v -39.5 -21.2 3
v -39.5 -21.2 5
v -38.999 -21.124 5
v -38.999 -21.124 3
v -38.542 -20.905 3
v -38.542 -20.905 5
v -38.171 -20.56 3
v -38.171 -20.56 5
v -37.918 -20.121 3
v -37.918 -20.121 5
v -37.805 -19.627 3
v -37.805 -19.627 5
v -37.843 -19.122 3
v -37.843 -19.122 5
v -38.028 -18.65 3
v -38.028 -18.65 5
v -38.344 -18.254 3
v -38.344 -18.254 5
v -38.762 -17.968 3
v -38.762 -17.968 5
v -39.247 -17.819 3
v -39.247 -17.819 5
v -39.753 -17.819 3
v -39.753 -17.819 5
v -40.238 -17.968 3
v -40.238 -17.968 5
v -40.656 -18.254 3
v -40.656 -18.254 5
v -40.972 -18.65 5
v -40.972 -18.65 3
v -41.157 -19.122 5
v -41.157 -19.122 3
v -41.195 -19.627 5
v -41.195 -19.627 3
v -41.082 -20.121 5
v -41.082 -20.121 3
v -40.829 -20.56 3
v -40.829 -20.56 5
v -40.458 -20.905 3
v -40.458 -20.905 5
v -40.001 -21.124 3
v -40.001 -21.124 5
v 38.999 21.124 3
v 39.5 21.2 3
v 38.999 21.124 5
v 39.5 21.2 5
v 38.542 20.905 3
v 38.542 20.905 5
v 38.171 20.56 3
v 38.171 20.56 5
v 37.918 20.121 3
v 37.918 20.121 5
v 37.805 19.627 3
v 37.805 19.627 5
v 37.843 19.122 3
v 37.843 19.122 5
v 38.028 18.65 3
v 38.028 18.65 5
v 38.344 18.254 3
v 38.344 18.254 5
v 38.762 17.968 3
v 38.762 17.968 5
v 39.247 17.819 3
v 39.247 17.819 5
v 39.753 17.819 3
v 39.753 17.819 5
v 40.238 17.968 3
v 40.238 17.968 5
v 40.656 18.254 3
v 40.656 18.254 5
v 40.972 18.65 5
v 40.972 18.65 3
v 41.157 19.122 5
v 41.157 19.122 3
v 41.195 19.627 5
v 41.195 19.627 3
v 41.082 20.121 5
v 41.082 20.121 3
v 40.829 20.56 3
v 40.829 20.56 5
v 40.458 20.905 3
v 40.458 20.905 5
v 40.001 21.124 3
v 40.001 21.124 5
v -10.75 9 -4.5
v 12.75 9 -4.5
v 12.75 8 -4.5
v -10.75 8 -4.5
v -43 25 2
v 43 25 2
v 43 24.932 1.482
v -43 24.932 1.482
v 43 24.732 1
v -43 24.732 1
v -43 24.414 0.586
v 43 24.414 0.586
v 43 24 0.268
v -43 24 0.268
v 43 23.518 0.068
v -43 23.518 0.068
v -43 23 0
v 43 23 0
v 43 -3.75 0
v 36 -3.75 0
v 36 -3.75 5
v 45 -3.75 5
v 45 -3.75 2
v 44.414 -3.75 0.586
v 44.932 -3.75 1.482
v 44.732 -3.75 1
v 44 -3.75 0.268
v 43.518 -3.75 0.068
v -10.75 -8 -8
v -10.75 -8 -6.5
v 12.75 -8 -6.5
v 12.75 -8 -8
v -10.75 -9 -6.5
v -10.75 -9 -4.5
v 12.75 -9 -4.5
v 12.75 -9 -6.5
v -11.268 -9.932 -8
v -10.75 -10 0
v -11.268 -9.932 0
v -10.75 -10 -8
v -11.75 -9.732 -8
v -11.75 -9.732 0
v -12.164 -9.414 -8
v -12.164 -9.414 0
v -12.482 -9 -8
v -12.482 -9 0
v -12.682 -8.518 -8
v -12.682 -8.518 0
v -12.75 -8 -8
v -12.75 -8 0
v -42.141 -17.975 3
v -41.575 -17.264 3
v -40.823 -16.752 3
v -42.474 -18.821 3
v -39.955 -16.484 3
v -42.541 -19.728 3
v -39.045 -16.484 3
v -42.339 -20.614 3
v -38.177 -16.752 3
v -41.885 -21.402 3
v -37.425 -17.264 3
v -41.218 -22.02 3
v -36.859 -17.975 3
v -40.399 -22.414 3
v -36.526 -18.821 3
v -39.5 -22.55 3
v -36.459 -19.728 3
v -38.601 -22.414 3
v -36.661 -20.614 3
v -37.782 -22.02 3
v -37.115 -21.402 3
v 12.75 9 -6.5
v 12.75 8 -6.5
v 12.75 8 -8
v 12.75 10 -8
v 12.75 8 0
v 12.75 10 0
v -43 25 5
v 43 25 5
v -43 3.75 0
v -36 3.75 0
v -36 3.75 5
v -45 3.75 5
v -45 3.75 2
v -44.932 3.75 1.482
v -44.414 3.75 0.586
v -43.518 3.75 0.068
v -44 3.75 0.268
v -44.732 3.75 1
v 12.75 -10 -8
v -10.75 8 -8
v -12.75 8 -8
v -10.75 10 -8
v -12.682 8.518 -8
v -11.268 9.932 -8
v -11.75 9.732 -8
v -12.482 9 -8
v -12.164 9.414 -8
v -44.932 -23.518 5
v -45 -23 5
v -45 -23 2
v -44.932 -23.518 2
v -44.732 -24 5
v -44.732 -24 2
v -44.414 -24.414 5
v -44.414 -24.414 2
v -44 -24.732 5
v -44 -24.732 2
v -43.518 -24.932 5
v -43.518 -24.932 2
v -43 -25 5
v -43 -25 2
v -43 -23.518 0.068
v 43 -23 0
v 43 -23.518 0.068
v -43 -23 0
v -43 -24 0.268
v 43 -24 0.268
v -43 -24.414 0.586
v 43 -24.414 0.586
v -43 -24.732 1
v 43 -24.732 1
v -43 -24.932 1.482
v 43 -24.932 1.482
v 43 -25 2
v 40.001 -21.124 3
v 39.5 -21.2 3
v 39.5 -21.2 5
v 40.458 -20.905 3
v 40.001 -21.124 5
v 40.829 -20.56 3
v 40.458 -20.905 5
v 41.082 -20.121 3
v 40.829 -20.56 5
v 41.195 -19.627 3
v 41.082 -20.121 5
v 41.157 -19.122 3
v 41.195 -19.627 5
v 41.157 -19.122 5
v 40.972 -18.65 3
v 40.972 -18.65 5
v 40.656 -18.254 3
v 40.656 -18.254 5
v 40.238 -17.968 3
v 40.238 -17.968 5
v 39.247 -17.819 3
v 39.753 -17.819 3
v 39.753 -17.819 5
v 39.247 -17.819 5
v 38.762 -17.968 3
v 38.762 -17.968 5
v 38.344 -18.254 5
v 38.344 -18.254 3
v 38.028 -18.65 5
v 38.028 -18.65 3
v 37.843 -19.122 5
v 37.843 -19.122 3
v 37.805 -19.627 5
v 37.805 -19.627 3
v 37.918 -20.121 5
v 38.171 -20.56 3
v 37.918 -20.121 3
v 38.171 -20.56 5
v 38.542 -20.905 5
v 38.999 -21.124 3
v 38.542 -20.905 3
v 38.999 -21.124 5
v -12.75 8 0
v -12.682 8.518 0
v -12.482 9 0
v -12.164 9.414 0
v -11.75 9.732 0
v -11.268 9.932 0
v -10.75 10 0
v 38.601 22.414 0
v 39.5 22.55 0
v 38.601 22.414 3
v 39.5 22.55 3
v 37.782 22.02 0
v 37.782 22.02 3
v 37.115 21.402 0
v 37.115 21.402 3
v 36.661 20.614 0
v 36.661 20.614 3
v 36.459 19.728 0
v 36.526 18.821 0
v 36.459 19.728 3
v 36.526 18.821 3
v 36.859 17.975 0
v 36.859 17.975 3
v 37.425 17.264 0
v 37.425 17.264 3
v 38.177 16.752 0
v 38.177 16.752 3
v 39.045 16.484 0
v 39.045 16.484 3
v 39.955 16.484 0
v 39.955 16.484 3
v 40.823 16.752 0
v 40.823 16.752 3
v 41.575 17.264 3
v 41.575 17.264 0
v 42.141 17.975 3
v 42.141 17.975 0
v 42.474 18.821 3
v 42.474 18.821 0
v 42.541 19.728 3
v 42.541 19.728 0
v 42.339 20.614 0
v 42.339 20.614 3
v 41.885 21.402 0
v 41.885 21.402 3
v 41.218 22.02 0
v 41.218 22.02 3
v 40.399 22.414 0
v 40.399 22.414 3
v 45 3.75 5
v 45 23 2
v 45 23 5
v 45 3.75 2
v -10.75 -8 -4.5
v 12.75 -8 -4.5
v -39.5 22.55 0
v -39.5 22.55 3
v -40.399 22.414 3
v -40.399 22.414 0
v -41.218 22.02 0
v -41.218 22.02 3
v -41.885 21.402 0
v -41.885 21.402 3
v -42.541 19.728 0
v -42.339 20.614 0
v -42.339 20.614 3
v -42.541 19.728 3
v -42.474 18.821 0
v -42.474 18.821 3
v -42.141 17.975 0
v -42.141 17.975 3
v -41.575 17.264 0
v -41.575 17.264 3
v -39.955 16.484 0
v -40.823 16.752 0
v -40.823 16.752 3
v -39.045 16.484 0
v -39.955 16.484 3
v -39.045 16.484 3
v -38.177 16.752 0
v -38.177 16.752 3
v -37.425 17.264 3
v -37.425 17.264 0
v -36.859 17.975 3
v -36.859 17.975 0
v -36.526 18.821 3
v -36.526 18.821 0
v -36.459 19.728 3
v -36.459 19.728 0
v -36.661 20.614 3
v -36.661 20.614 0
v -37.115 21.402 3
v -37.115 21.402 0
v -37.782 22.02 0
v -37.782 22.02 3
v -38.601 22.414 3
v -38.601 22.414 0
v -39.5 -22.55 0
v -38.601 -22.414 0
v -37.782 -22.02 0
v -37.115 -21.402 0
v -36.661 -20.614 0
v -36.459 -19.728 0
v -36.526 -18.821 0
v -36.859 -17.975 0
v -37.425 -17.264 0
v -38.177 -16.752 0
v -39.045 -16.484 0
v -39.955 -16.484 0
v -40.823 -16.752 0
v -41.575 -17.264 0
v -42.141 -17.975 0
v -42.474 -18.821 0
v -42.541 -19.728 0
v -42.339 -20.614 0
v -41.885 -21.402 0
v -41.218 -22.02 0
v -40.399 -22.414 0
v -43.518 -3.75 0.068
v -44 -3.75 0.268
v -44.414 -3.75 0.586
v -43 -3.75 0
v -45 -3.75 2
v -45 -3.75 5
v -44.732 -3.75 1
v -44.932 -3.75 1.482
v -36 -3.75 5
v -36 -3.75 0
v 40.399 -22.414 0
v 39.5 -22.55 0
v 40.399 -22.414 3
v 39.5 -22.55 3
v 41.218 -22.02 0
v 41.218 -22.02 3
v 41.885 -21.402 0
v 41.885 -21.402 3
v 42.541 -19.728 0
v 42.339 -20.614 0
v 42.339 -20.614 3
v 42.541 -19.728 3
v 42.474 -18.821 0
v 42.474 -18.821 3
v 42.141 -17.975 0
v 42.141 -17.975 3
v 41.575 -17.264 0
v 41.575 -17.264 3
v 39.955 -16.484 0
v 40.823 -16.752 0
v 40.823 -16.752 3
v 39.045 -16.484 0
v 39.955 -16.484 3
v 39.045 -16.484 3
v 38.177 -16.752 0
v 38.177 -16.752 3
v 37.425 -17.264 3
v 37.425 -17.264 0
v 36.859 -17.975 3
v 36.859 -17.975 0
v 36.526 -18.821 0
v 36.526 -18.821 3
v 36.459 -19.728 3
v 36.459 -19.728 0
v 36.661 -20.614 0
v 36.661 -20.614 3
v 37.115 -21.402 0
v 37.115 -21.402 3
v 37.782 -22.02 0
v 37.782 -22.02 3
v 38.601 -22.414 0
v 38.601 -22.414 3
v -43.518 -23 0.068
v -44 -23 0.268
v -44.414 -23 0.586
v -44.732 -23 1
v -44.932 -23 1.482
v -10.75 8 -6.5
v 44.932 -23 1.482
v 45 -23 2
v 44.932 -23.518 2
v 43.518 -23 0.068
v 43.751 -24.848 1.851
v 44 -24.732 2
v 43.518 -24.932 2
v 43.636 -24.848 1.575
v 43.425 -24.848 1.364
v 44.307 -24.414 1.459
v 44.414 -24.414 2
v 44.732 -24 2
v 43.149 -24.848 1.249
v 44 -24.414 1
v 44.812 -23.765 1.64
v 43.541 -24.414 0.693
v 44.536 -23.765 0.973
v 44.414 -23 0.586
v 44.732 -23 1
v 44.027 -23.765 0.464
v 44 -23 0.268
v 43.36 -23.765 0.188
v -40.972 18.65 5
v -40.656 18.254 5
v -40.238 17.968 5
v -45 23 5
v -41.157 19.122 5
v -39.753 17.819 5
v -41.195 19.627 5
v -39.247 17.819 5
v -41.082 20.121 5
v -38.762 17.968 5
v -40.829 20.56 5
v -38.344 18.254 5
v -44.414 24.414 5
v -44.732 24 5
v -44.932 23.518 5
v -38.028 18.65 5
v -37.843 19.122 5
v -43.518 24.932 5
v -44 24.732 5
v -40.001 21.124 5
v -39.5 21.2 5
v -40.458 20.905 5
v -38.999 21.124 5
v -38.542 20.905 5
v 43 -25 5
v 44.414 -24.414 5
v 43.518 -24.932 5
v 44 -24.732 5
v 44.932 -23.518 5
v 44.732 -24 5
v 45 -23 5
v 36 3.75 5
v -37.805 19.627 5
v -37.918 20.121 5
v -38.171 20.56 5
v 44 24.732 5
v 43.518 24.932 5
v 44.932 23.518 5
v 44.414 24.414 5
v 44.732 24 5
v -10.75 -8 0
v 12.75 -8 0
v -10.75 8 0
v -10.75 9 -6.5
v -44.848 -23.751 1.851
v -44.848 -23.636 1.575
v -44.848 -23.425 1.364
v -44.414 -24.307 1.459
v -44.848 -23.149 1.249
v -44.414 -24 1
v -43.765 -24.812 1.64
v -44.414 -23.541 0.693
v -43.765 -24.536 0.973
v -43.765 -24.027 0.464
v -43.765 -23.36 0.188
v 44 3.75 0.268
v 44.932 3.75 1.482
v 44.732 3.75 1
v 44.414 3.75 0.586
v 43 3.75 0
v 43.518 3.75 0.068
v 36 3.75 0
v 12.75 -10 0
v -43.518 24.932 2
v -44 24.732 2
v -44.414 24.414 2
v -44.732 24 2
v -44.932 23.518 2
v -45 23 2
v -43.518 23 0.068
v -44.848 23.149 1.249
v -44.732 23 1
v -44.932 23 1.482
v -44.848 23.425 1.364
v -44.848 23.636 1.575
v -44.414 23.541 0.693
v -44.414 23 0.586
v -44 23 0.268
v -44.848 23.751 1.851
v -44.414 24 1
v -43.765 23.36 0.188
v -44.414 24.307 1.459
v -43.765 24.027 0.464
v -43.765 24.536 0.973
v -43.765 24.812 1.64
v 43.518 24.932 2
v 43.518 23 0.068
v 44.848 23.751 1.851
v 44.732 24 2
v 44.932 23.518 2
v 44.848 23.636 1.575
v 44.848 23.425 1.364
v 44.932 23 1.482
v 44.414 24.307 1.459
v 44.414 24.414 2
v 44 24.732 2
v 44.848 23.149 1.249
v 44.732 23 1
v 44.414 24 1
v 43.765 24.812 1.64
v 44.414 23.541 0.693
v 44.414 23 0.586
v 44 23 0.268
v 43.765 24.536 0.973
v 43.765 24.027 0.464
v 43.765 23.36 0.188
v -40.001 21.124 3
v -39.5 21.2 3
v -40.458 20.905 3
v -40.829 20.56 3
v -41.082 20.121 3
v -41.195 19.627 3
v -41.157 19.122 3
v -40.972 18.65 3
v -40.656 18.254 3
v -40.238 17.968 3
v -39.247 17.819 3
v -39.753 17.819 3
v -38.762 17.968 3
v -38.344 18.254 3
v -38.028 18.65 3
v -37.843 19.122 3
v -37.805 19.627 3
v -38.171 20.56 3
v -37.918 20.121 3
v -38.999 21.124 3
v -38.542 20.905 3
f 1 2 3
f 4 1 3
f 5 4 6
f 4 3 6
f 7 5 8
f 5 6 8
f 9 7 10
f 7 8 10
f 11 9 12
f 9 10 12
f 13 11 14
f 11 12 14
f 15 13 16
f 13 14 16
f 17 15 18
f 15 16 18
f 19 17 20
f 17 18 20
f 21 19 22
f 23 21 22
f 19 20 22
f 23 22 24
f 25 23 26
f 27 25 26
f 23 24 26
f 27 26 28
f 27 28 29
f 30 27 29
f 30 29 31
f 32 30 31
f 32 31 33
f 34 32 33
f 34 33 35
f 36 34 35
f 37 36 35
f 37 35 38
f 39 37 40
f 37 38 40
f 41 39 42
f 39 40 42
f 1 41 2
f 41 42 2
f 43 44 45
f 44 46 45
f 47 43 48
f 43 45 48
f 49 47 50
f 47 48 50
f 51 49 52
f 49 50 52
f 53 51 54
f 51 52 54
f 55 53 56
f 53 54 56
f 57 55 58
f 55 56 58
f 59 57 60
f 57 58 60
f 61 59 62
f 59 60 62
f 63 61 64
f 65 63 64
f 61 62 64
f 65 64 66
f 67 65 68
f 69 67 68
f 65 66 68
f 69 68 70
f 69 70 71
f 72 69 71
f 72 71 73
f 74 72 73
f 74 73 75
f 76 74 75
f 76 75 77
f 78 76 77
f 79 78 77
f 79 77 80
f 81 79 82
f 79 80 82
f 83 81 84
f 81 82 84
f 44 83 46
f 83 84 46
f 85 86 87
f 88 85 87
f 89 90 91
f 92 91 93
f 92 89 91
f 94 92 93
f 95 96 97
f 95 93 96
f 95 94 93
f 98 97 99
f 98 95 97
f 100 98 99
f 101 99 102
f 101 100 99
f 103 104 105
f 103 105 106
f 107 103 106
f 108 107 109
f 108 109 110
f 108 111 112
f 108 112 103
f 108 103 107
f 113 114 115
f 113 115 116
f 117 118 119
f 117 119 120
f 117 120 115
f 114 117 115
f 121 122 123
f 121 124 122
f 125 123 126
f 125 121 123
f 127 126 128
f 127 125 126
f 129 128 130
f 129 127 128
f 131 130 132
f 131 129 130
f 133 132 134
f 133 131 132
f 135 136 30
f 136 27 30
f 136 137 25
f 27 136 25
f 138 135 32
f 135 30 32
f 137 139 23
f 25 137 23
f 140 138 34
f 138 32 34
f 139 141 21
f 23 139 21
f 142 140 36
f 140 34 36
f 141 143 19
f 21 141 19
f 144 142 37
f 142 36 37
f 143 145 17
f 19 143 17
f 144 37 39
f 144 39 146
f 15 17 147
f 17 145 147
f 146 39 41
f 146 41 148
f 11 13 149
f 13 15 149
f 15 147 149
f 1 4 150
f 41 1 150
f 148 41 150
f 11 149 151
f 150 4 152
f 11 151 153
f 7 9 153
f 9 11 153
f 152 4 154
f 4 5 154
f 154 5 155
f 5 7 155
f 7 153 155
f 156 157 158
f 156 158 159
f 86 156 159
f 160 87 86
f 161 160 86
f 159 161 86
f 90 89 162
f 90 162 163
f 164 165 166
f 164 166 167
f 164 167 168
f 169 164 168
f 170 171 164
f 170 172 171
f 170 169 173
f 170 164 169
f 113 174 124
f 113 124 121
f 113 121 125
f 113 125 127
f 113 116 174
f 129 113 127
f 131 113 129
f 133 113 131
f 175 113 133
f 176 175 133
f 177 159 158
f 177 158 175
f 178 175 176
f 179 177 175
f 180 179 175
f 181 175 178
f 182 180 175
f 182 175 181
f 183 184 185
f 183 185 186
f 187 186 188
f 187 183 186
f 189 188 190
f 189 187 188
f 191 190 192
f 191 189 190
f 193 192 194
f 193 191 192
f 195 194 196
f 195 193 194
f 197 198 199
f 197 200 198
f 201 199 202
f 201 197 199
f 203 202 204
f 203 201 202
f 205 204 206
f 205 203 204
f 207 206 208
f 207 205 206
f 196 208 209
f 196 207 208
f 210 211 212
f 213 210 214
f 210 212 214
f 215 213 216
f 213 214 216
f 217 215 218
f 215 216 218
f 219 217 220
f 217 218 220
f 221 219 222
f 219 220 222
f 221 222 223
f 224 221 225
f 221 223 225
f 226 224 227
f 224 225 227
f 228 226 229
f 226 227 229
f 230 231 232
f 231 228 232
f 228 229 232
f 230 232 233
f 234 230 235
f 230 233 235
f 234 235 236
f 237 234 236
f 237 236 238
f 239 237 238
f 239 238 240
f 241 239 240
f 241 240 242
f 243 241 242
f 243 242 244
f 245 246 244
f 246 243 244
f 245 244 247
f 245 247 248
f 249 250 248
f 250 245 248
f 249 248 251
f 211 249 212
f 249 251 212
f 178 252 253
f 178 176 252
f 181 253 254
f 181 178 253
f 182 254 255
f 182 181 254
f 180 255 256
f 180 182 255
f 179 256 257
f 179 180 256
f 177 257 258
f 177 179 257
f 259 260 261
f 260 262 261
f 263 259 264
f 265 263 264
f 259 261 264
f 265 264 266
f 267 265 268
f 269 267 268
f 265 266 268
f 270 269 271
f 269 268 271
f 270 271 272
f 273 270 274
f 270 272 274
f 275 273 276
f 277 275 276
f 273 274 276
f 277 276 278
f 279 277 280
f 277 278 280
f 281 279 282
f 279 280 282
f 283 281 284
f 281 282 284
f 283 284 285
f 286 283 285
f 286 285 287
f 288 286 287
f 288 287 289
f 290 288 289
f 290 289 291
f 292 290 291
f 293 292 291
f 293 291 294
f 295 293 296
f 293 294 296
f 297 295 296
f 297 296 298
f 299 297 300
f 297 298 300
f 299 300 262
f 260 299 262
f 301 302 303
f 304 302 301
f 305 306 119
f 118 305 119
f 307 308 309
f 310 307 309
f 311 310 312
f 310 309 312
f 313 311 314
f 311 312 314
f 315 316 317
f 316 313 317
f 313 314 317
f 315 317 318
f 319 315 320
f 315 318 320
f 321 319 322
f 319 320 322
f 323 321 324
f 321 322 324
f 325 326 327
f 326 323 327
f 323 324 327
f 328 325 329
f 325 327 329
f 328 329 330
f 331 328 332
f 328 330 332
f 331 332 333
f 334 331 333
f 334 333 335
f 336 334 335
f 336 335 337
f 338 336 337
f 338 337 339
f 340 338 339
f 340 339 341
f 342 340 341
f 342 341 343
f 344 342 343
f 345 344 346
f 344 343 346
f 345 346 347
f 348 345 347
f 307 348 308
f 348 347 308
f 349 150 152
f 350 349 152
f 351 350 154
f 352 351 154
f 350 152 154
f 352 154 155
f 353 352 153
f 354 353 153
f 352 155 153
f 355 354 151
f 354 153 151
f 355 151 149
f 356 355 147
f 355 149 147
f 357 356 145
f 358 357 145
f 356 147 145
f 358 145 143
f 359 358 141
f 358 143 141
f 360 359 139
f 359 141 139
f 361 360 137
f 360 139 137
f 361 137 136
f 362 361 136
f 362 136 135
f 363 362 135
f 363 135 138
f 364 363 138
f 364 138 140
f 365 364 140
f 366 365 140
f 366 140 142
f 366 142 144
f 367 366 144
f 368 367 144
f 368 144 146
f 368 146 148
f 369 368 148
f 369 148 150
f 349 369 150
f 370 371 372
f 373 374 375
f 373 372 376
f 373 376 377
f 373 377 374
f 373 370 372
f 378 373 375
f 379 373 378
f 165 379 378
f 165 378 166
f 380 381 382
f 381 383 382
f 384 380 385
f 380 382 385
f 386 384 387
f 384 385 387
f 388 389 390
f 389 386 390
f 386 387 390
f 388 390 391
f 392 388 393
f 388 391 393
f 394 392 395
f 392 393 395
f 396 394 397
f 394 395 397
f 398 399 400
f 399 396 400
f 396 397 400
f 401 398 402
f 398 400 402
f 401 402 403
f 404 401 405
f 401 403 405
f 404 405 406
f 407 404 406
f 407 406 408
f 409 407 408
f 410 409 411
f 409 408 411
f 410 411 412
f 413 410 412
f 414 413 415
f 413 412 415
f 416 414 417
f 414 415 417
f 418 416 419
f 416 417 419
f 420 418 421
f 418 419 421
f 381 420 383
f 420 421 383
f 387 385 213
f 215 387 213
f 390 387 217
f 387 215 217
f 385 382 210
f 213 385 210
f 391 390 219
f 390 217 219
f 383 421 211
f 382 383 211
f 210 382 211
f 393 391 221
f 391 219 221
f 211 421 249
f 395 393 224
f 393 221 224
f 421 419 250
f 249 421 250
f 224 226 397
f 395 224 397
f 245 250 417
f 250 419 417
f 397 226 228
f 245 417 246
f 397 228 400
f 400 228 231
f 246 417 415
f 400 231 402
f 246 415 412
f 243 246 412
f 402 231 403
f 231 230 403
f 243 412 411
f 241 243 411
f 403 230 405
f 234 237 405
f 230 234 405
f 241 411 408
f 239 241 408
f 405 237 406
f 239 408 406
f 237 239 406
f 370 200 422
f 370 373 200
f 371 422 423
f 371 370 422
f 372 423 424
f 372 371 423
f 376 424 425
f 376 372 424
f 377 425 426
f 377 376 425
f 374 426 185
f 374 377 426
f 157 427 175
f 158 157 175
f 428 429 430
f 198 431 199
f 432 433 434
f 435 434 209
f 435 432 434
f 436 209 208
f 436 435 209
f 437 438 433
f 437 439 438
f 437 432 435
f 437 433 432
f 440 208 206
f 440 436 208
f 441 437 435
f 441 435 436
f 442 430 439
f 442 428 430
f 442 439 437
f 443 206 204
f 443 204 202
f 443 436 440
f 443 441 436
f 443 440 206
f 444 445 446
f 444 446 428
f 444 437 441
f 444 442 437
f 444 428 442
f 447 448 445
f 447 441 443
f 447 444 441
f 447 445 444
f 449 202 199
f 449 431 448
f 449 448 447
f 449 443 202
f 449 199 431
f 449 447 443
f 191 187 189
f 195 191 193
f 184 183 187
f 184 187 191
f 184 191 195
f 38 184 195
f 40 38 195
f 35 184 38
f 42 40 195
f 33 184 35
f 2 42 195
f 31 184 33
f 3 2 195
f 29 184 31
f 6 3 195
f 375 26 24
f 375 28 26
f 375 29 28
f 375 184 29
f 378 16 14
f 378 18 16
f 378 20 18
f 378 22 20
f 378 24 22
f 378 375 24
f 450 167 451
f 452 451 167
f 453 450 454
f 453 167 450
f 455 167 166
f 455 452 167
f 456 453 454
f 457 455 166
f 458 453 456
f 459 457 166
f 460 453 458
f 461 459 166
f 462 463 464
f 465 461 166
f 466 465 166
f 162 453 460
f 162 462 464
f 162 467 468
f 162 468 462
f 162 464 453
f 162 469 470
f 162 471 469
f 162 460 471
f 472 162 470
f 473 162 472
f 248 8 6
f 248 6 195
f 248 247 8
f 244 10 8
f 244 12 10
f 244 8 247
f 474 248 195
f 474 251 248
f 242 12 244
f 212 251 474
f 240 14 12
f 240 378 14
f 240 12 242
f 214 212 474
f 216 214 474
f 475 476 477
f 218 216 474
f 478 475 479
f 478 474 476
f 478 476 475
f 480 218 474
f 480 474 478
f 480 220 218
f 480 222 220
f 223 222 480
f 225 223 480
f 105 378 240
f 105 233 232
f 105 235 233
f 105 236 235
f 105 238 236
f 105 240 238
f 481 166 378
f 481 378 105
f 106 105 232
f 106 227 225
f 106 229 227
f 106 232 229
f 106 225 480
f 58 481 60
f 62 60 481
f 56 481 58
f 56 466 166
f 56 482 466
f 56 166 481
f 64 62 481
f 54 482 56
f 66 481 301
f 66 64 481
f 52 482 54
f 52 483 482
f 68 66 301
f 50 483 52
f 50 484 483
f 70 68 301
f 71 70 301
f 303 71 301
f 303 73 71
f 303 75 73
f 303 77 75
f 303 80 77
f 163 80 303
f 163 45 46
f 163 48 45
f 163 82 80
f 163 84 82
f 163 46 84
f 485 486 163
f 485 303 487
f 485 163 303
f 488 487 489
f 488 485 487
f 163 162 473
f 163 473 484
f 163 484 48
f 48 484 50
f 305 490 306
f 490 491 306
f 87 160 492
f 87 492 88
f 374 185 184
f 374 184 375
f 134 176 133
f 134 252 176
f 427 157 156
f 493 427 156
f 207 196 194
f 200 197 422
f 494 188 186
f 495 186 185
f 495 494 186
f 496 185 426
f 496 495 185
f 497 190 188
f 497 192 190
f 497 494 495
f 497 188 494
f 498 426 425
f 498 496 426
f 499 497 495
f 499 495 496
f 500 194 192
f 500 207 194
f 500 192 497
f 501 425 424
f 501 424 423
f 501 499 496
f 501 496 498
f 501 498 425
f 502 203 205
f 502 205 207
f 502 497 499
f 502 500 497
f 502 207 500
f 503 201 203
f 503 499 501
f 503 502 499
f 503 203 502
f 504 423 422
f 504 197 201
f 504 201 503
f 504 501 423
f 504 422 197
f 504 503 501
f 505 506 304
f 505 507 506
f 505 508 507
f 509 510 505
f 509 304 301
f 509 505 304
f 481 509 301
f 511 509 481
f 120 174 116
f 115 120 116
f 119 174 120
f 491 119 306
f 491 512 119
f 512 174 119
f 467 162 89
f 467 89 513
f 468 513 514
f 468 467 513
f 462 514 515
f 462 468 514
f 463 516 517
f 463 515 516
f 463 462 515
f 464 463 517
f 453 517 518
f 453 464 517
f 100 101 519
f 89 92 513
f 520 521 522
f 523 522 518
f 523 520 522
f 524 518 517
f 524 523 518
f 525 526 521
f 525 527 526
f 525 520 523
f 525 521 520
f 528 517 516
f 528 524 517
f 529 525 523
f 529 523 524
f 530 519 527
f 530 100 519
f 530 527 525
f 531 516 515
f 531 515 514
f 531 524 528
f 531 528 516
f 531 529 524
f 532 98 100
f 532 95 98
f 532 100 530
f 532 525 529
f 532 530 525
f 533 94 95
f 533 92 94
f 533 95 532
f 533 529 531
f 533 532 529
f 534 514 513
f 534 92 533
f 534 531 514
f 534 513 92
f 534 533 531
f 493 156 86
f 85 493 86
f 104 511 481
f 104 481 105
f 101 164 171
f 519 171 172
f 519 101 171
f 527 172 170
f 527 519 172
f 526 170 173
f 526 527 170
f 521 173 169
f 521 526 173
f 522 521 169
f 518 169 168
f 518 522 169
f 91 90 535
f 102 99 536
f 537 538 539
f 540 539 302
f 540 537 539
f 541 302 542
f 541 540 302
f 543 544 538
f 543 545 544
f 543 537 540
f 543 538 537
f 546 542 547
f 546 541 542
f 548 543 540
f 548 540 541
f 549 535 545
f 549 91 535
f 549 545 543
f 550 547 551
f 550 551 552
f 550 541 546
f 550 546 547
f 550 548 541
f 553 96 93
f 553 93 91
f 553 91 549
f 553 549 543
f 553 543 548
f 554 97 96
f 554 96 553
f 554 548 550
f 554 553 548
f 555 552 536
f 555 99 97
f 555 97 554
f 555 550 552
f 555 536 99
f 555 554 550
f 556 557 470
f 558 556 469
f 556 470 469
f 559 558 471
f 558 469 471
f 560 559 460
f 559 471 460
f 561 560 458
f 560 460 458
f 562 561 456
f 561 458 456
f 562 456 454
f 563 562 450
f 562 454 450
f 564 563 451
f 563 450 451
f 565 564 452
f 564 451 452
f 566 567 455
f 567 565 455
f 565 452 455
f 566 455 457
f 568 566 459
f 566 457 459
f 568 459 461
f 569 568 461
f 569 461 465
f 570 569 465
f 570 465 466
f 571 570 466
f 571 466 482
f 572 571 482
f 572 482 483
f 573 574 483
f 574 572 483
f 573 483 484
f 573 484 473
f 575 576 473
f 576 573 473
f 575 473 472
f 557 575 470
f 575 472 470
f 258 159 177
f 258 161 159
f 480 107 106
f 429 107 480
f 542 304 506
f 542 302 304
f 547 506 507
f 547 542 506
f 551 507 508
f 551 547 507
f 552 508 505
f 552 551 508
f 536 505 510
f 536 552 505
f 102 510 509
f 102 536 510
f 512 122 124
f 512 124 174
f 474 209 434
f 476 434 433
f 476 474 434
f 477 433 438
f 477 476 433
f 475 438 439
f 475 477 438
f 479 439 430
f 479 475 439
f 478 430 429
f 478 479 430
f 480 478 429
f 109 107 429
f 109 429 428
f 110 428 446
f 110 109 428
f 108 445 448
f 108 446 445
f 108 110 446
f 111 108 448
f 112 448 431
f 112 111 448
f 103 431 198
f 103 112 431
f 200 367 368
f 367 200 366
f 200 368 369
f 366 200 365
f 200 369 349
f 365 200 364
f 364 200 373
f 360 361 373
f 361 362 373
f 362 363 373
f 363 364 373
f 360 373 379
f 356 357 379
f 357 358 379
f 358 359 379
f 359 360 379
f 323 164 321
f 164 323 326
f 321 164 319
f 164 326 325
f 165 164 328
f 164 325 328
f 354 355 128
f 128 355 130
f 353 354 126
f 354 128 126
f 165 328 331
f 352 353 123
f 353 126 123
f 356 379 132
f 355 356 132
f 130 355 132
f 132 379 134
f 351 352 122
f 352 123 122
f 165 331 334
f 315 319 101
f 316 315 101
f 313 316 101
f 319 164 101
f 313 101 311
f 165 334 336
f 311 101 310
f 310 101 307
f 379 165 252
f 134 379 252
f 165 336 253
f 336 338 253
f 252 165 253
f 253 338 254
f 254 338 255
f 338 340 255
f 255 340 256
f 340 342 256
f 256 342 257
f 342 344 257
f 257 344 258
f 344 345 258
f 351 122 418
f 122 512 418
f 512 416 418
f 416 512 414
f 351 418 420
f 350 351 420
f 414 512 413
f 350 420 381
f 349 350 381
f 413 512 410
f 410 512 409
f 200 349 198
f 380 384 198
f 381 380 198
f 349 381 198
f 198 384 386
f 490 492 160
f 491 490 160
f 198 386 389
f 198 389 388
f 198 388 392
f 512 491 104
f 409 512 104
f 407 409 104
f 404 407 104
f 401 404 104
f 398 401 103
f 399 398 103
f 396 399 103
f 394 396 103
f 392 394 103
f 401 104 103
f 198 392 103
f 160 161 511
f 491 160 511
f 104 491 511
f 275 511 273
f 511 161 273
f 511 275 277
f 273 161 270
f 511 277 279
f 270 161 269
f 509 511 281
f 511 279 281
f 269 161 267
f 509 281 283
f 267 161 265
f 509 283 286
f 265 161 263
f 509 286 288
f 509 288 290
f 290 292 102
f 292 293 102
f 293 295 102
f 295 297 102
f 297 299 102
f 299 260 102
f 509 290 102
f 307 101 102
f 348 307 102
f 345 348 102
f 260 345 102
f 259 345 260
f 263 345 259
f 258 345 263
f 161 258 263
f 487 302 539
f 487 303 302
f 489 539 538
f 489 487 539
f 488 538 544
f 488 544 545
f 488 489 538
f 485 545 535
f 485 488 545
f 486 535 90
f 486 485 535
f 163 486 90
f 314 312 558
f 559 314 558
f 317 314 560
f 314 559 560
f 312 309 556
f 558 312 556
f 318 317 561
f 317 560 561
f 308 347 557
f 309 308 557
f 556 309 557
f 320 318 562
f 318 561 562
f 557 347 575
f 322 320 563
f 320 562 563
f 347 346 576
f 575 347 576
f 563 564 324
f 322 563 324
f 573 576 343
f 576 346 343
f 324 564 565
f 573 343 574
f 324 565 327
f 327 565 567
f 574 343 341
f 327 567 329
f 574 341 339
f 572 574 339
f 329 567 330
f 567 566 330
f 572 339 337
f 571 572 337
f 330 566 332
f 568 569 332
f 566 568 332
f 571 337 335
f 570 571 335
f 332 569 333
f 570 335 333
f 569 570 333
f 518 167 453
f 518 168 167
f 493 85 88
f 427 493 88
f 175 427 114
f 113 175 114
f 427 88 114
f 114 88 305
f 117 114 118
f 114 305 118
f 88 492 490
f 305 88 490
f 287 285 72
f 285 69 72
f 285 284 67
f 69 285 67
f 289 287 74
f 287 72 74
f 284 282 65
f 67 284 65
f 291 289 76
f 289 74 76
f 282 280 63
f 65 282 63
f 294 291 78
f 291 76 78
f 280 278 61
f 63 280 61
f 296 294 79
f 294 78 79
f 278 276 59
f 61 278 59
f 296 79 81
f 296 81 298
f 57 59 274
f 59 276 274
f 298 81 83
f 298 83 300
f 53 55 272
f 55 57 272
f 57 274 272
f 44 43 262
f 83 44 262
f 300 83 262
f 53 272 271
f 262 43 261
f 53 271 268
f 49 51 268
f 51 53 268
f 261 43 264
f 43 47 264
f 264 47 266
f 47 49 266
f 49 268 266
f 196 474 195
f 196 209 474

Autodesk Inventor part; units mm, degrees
ref_plane "YZ Plane" through (0, 0, 0) normal (1, 0, 0) x (0, 1, 0)
ref_plane "XZ Plane" through (0, 0, 0) normal (0, 1, 0) x (-1, 0, 0)
ref_plane "XY Plane" through (0, 0, 0) normal (0, 0, 1) x (1, 0, 0)
sketch "Náčrt1" plane through (0, 0, 0) normal (0, 0, 1) x (1, 0, 0)
  line L0 (0, 35) -> (0, -35) projected
  line L1 (-63, 0) -> (63, 0) projected
  line L2 (-45, 25) -> (45, 25)
  line L3 (45, 25) -> (45, -25)
  line L4 (45, -25) -> (-45, -25)
  line L5 (-45, -25) -> (-45, 25)
  point P0 (0, 0)
  dimension "d0" = 90
  dimension "d1" = 50
extrude "Vysunutí1" add sketch "Náčrt1" along normal blind 5
sketch "Náčrt4" plane through (0, 0, 0) normal (0, 0, -1) x (-1, 0, 0)
  line L0 (45, 25) -> (45, -25) projected
  line L1 (-45, 25) -> (45, 25) projected
  line L2 (-45, -25) -> (-45, 25) projected
  line L3 (45, -25) -> (-45, -25) projected
  line L4 (0, -35) -> (0, 35) projected
  line L5 (-63, 0) -> (63, 0) projected
  point P0 (0, 0)
  point P1 (-39.5, 19.5)
  dimension "d13" = 5.5
  dimension "d14" = 5.5
hole "Díra1" at (39.5, 19.5, 0) direction (0, 0, 1) diameter 3.4 end through all counterbore diameter 6.1 counterbore depth 3 clearance for "Strojní šroub se zápustnou hlavou" size "M3" standard "Ansi M metrický profil"
mirror "Zrcadlit2" about plane through (0, 0, 0) normal (0, 1, 0) of "Díra1"
mirror "Zrcadlit3" about plane through (0, 0, 0) normal (1, 0, 0) of "Díra1", "Zrcadlit2"
fillet "Zaoblení2" radius 2 8 edges at (0, 25, 0) (45, 0, 0) (45, 25, 2.5) (0, -25, 0) (45, -25, 2.5) (-45, 0, 0) (-45, -25, 2.5) (-45, 25, 2.5)
sketch "Náčrt6" plane through (0, 0, 0) normal (0, 0, -1) x (-1, 0, 0)
  circle A0 centre (-39.5, 19.5) radius 3.05 projected
  circle A1 centre (-39.5, -19.5) radius 3.05 projected
  circle A2 centre (39.5, 19.5) radius 3.05 projected
  circle A3 centre (39.5, -19.5) radius 3.05 projected
  line L0 (43, -23) -> (-43, -23) projected
  line L1 (43, 23) -> (43, -23) projected
  line L2 (-43, 23) -> (43, 23) projected
  line L3 (-43, -23) -> (-43, 23) projected
  line L4 (-43, 23) -> (-45, 23) projected
  line L5 (-45, 23) -> (-45, -23) projected
  line L6 (-45, -23) -> (-43, -23) projected
  line L7 (-43, -23) -> (-43, 23) projected
  line L8 (-45, 3.75) -> (-36, 3.75)
  line L9 (-36, 3.75) -> (-36, -3.75)
  line L10 (-36, -3.75) -> (-45, -3.75)
  line L11 (-45, -3.75) -> (-45, 3.75)
  line L12 (-63, 0) -> (63, 0) projected
  point P0 (0, 0)
  dimension "d23" = 9
  dimension "d24" = 7.5
extrude "Vysunutí4" cut sketch "Náčrt6" against normal through all contours L10 L5 L12 L3 | L3 L12 L9 L10 | L12 L3 L8 L9 | L12 L5 L8 L3
mirror "Zrcadlit4" about plane through (0, 0, 0) normal (1, 0, 0) of "Vysunutí4"
sketch "Náčrt7" plane through (0, 0, 0) normal (0, 0, -1) x (-1, 0, 0)
  circle A0 centre (39.5, -19.5) radius 3.05 projected
  circle A1 centre (39.5, 19.5) radius 3.05 projected
  circle A2 centre (-39.5, -19.5) radius 3.05 projected
  circle A3 centre (-39.5, 19.5) radius 3.05 projected
  line L0 (43, -3.75) -> (36, -3.75) projected
  line L1 (36, -3.75) -> (36, 3.75) projected
  line L2 (36, 3.75) -> (43, 3.75) projected
  line L3 (43, 23) -> (43, 3.75) projected
  line L4 (-43, 23) -> (43, 23) projected
  line L5 (-43, 3.75) -> (-43, 23) projected
  line L6 (-43, 3.75) -> (-36, 3.75) projected
  line L7 (-36, 3.75) -> (-36, -3.75) projected
  line L8 (-36, -3.75) -> (-43, -3.75) projected
  line L9 (-43, -23) -> (-43, -3.75) projected
  line L10 (43, -23) -> (-43, -23) projected
  line L11 (43, -3.75) -> (43, -23) projected
  line L12 (43, 25) -> (-43, 25) projected
  line L13 (-43, -25) -> (43, -25) projected
  line L14 (-45, -3.75) -> (-45, -23) projected
  line L15 (45, -23) -> (45, -3.75) projected
  line L16 (45, 3.75) -> (45, 23) projected
  line L17 (-45, 23) -> (-45, 3.75) projected
  line L18 (0, -35) -> (0, 35) projected
  line L19 (-63, 0) -> (63, 0) projected
  line L20 (-12.75, 10) -> (12.75, 10)
  line L21 (12.75, 10) -> (12.75, -10)
  line L22 (12.75, -10) -> (-12.75, -10)
  line L23 (-12.75, -10) -> (-12.75, 10)
  line L24 (-10.75, 8) -> (10.75, 8)
  line L25 (10.75, 8) -> (10.75, -8)
  line L26 (10.75, -8) -> (-10.75, -8)
  line L27 (-10.75, -8) -> (-10.75, 8)
  line L28 (0, -8) -> (12.75, -8)
  line L29 (12.75, -8) -> (12.75, -10)
  line L30 (12.75, -10) -> (0, -10)
  line L31 (0, -10) -> (0, -8)
  line L32 (10.75, 0) -> (12.75, 0)
  line L33 (12.75, 0) -> (12.75, -10)
  line L34 (12.75, -10) -> (10.75, -10)
  line L35 (10.75, -10) -> (10.75, 0)
  point P0 (0, 0)
  dimension "d27" = 20
  dimension "d28" = 25.5
  dimension "d29" = 21.5
  dimension "d30" = 16
extrude "Vysunutí5" add sketch "Náčrt7" along normal blind 8 contours L21 L28 L25 L19 | L19 L25 L24 L18 L20 L21 | L22 L23 L19 L27 L26 L18 | L18 L26 L35 L22 | L21 L22 L35 L28 | L18 L24 L27 L19 L23 L20
sketch "Náčrt8" plane through (12.75, -10, 0) normal (1, 0, 0) x (0, 0, -1)
  line L0 (0, 2) -> (0, 18) projected
  line L1 (0, 2) -> (8, 2) projected
  line L2 (8, 18) -> (8, 2) projected
  line L3 (0, 18) -> (8, 18) projected
  line L4 (8, 18) -> (0, 18)
  line L5 (0, 18) -> (0, 2)
  line L6 (0, 2) -> (8, 2)
  line L7 (8, 2) -> (8, 18)
  point P0 (0, 10)
extrude "Vysunutí6" cut sketch "Náčrt8" against normal up to surface (2 mm away)
sketch "Náčrt9" plane through (12.75, 8, 0) normal (1, 0, 0) x (0, 0, -1)
  line L0 (8, -16) -> (0, -16) projected
  line L1 (0, -18) -> (0, -16) projected
  line L2 (0, -18) -> (8, -18) projected
  line L3 (8, -16) -> (8, -18) projected
  line L4 (0, 0) -> (8, 0) projected
  line L5 (8, 2) -> (8, 0) projected
  line L6 (0, 2) -> (8, 2) projected
  line L7 (0, 0) -> (0, 2) projected
  line L8 (4.5, 0) -> (6.5, 0)
  line L9 (6.5, 0) -> (6.5, 1)
  line L10 (6.5, 1) -> (4.5, 1)
  line L11 (4.5, 1) -> (4.5, 0)
  line L12 (-7.6, -8) -> (10.6, -8) projected
  point P0 (0, -8)
  dimension "d35" = 1
  dimension "d36" = 2
  dimension "d37" = 1.5
extrude "Vysunutí7" cut sketch "Náčrt9" against normal up to surface (23.5 mm away) contours L11 L10 L9 L4
mirror "Zrcadlit5" about plane through (0, 0, 0) normal (0, 1, 0) of "Vysunutí7"
fillet "Zaoblení3" radius 2 2 edges at (-12.75, 10, -4) (-12.75, -10, -4)
properties part number "tcs3200_gate_lid_3D tisk"
